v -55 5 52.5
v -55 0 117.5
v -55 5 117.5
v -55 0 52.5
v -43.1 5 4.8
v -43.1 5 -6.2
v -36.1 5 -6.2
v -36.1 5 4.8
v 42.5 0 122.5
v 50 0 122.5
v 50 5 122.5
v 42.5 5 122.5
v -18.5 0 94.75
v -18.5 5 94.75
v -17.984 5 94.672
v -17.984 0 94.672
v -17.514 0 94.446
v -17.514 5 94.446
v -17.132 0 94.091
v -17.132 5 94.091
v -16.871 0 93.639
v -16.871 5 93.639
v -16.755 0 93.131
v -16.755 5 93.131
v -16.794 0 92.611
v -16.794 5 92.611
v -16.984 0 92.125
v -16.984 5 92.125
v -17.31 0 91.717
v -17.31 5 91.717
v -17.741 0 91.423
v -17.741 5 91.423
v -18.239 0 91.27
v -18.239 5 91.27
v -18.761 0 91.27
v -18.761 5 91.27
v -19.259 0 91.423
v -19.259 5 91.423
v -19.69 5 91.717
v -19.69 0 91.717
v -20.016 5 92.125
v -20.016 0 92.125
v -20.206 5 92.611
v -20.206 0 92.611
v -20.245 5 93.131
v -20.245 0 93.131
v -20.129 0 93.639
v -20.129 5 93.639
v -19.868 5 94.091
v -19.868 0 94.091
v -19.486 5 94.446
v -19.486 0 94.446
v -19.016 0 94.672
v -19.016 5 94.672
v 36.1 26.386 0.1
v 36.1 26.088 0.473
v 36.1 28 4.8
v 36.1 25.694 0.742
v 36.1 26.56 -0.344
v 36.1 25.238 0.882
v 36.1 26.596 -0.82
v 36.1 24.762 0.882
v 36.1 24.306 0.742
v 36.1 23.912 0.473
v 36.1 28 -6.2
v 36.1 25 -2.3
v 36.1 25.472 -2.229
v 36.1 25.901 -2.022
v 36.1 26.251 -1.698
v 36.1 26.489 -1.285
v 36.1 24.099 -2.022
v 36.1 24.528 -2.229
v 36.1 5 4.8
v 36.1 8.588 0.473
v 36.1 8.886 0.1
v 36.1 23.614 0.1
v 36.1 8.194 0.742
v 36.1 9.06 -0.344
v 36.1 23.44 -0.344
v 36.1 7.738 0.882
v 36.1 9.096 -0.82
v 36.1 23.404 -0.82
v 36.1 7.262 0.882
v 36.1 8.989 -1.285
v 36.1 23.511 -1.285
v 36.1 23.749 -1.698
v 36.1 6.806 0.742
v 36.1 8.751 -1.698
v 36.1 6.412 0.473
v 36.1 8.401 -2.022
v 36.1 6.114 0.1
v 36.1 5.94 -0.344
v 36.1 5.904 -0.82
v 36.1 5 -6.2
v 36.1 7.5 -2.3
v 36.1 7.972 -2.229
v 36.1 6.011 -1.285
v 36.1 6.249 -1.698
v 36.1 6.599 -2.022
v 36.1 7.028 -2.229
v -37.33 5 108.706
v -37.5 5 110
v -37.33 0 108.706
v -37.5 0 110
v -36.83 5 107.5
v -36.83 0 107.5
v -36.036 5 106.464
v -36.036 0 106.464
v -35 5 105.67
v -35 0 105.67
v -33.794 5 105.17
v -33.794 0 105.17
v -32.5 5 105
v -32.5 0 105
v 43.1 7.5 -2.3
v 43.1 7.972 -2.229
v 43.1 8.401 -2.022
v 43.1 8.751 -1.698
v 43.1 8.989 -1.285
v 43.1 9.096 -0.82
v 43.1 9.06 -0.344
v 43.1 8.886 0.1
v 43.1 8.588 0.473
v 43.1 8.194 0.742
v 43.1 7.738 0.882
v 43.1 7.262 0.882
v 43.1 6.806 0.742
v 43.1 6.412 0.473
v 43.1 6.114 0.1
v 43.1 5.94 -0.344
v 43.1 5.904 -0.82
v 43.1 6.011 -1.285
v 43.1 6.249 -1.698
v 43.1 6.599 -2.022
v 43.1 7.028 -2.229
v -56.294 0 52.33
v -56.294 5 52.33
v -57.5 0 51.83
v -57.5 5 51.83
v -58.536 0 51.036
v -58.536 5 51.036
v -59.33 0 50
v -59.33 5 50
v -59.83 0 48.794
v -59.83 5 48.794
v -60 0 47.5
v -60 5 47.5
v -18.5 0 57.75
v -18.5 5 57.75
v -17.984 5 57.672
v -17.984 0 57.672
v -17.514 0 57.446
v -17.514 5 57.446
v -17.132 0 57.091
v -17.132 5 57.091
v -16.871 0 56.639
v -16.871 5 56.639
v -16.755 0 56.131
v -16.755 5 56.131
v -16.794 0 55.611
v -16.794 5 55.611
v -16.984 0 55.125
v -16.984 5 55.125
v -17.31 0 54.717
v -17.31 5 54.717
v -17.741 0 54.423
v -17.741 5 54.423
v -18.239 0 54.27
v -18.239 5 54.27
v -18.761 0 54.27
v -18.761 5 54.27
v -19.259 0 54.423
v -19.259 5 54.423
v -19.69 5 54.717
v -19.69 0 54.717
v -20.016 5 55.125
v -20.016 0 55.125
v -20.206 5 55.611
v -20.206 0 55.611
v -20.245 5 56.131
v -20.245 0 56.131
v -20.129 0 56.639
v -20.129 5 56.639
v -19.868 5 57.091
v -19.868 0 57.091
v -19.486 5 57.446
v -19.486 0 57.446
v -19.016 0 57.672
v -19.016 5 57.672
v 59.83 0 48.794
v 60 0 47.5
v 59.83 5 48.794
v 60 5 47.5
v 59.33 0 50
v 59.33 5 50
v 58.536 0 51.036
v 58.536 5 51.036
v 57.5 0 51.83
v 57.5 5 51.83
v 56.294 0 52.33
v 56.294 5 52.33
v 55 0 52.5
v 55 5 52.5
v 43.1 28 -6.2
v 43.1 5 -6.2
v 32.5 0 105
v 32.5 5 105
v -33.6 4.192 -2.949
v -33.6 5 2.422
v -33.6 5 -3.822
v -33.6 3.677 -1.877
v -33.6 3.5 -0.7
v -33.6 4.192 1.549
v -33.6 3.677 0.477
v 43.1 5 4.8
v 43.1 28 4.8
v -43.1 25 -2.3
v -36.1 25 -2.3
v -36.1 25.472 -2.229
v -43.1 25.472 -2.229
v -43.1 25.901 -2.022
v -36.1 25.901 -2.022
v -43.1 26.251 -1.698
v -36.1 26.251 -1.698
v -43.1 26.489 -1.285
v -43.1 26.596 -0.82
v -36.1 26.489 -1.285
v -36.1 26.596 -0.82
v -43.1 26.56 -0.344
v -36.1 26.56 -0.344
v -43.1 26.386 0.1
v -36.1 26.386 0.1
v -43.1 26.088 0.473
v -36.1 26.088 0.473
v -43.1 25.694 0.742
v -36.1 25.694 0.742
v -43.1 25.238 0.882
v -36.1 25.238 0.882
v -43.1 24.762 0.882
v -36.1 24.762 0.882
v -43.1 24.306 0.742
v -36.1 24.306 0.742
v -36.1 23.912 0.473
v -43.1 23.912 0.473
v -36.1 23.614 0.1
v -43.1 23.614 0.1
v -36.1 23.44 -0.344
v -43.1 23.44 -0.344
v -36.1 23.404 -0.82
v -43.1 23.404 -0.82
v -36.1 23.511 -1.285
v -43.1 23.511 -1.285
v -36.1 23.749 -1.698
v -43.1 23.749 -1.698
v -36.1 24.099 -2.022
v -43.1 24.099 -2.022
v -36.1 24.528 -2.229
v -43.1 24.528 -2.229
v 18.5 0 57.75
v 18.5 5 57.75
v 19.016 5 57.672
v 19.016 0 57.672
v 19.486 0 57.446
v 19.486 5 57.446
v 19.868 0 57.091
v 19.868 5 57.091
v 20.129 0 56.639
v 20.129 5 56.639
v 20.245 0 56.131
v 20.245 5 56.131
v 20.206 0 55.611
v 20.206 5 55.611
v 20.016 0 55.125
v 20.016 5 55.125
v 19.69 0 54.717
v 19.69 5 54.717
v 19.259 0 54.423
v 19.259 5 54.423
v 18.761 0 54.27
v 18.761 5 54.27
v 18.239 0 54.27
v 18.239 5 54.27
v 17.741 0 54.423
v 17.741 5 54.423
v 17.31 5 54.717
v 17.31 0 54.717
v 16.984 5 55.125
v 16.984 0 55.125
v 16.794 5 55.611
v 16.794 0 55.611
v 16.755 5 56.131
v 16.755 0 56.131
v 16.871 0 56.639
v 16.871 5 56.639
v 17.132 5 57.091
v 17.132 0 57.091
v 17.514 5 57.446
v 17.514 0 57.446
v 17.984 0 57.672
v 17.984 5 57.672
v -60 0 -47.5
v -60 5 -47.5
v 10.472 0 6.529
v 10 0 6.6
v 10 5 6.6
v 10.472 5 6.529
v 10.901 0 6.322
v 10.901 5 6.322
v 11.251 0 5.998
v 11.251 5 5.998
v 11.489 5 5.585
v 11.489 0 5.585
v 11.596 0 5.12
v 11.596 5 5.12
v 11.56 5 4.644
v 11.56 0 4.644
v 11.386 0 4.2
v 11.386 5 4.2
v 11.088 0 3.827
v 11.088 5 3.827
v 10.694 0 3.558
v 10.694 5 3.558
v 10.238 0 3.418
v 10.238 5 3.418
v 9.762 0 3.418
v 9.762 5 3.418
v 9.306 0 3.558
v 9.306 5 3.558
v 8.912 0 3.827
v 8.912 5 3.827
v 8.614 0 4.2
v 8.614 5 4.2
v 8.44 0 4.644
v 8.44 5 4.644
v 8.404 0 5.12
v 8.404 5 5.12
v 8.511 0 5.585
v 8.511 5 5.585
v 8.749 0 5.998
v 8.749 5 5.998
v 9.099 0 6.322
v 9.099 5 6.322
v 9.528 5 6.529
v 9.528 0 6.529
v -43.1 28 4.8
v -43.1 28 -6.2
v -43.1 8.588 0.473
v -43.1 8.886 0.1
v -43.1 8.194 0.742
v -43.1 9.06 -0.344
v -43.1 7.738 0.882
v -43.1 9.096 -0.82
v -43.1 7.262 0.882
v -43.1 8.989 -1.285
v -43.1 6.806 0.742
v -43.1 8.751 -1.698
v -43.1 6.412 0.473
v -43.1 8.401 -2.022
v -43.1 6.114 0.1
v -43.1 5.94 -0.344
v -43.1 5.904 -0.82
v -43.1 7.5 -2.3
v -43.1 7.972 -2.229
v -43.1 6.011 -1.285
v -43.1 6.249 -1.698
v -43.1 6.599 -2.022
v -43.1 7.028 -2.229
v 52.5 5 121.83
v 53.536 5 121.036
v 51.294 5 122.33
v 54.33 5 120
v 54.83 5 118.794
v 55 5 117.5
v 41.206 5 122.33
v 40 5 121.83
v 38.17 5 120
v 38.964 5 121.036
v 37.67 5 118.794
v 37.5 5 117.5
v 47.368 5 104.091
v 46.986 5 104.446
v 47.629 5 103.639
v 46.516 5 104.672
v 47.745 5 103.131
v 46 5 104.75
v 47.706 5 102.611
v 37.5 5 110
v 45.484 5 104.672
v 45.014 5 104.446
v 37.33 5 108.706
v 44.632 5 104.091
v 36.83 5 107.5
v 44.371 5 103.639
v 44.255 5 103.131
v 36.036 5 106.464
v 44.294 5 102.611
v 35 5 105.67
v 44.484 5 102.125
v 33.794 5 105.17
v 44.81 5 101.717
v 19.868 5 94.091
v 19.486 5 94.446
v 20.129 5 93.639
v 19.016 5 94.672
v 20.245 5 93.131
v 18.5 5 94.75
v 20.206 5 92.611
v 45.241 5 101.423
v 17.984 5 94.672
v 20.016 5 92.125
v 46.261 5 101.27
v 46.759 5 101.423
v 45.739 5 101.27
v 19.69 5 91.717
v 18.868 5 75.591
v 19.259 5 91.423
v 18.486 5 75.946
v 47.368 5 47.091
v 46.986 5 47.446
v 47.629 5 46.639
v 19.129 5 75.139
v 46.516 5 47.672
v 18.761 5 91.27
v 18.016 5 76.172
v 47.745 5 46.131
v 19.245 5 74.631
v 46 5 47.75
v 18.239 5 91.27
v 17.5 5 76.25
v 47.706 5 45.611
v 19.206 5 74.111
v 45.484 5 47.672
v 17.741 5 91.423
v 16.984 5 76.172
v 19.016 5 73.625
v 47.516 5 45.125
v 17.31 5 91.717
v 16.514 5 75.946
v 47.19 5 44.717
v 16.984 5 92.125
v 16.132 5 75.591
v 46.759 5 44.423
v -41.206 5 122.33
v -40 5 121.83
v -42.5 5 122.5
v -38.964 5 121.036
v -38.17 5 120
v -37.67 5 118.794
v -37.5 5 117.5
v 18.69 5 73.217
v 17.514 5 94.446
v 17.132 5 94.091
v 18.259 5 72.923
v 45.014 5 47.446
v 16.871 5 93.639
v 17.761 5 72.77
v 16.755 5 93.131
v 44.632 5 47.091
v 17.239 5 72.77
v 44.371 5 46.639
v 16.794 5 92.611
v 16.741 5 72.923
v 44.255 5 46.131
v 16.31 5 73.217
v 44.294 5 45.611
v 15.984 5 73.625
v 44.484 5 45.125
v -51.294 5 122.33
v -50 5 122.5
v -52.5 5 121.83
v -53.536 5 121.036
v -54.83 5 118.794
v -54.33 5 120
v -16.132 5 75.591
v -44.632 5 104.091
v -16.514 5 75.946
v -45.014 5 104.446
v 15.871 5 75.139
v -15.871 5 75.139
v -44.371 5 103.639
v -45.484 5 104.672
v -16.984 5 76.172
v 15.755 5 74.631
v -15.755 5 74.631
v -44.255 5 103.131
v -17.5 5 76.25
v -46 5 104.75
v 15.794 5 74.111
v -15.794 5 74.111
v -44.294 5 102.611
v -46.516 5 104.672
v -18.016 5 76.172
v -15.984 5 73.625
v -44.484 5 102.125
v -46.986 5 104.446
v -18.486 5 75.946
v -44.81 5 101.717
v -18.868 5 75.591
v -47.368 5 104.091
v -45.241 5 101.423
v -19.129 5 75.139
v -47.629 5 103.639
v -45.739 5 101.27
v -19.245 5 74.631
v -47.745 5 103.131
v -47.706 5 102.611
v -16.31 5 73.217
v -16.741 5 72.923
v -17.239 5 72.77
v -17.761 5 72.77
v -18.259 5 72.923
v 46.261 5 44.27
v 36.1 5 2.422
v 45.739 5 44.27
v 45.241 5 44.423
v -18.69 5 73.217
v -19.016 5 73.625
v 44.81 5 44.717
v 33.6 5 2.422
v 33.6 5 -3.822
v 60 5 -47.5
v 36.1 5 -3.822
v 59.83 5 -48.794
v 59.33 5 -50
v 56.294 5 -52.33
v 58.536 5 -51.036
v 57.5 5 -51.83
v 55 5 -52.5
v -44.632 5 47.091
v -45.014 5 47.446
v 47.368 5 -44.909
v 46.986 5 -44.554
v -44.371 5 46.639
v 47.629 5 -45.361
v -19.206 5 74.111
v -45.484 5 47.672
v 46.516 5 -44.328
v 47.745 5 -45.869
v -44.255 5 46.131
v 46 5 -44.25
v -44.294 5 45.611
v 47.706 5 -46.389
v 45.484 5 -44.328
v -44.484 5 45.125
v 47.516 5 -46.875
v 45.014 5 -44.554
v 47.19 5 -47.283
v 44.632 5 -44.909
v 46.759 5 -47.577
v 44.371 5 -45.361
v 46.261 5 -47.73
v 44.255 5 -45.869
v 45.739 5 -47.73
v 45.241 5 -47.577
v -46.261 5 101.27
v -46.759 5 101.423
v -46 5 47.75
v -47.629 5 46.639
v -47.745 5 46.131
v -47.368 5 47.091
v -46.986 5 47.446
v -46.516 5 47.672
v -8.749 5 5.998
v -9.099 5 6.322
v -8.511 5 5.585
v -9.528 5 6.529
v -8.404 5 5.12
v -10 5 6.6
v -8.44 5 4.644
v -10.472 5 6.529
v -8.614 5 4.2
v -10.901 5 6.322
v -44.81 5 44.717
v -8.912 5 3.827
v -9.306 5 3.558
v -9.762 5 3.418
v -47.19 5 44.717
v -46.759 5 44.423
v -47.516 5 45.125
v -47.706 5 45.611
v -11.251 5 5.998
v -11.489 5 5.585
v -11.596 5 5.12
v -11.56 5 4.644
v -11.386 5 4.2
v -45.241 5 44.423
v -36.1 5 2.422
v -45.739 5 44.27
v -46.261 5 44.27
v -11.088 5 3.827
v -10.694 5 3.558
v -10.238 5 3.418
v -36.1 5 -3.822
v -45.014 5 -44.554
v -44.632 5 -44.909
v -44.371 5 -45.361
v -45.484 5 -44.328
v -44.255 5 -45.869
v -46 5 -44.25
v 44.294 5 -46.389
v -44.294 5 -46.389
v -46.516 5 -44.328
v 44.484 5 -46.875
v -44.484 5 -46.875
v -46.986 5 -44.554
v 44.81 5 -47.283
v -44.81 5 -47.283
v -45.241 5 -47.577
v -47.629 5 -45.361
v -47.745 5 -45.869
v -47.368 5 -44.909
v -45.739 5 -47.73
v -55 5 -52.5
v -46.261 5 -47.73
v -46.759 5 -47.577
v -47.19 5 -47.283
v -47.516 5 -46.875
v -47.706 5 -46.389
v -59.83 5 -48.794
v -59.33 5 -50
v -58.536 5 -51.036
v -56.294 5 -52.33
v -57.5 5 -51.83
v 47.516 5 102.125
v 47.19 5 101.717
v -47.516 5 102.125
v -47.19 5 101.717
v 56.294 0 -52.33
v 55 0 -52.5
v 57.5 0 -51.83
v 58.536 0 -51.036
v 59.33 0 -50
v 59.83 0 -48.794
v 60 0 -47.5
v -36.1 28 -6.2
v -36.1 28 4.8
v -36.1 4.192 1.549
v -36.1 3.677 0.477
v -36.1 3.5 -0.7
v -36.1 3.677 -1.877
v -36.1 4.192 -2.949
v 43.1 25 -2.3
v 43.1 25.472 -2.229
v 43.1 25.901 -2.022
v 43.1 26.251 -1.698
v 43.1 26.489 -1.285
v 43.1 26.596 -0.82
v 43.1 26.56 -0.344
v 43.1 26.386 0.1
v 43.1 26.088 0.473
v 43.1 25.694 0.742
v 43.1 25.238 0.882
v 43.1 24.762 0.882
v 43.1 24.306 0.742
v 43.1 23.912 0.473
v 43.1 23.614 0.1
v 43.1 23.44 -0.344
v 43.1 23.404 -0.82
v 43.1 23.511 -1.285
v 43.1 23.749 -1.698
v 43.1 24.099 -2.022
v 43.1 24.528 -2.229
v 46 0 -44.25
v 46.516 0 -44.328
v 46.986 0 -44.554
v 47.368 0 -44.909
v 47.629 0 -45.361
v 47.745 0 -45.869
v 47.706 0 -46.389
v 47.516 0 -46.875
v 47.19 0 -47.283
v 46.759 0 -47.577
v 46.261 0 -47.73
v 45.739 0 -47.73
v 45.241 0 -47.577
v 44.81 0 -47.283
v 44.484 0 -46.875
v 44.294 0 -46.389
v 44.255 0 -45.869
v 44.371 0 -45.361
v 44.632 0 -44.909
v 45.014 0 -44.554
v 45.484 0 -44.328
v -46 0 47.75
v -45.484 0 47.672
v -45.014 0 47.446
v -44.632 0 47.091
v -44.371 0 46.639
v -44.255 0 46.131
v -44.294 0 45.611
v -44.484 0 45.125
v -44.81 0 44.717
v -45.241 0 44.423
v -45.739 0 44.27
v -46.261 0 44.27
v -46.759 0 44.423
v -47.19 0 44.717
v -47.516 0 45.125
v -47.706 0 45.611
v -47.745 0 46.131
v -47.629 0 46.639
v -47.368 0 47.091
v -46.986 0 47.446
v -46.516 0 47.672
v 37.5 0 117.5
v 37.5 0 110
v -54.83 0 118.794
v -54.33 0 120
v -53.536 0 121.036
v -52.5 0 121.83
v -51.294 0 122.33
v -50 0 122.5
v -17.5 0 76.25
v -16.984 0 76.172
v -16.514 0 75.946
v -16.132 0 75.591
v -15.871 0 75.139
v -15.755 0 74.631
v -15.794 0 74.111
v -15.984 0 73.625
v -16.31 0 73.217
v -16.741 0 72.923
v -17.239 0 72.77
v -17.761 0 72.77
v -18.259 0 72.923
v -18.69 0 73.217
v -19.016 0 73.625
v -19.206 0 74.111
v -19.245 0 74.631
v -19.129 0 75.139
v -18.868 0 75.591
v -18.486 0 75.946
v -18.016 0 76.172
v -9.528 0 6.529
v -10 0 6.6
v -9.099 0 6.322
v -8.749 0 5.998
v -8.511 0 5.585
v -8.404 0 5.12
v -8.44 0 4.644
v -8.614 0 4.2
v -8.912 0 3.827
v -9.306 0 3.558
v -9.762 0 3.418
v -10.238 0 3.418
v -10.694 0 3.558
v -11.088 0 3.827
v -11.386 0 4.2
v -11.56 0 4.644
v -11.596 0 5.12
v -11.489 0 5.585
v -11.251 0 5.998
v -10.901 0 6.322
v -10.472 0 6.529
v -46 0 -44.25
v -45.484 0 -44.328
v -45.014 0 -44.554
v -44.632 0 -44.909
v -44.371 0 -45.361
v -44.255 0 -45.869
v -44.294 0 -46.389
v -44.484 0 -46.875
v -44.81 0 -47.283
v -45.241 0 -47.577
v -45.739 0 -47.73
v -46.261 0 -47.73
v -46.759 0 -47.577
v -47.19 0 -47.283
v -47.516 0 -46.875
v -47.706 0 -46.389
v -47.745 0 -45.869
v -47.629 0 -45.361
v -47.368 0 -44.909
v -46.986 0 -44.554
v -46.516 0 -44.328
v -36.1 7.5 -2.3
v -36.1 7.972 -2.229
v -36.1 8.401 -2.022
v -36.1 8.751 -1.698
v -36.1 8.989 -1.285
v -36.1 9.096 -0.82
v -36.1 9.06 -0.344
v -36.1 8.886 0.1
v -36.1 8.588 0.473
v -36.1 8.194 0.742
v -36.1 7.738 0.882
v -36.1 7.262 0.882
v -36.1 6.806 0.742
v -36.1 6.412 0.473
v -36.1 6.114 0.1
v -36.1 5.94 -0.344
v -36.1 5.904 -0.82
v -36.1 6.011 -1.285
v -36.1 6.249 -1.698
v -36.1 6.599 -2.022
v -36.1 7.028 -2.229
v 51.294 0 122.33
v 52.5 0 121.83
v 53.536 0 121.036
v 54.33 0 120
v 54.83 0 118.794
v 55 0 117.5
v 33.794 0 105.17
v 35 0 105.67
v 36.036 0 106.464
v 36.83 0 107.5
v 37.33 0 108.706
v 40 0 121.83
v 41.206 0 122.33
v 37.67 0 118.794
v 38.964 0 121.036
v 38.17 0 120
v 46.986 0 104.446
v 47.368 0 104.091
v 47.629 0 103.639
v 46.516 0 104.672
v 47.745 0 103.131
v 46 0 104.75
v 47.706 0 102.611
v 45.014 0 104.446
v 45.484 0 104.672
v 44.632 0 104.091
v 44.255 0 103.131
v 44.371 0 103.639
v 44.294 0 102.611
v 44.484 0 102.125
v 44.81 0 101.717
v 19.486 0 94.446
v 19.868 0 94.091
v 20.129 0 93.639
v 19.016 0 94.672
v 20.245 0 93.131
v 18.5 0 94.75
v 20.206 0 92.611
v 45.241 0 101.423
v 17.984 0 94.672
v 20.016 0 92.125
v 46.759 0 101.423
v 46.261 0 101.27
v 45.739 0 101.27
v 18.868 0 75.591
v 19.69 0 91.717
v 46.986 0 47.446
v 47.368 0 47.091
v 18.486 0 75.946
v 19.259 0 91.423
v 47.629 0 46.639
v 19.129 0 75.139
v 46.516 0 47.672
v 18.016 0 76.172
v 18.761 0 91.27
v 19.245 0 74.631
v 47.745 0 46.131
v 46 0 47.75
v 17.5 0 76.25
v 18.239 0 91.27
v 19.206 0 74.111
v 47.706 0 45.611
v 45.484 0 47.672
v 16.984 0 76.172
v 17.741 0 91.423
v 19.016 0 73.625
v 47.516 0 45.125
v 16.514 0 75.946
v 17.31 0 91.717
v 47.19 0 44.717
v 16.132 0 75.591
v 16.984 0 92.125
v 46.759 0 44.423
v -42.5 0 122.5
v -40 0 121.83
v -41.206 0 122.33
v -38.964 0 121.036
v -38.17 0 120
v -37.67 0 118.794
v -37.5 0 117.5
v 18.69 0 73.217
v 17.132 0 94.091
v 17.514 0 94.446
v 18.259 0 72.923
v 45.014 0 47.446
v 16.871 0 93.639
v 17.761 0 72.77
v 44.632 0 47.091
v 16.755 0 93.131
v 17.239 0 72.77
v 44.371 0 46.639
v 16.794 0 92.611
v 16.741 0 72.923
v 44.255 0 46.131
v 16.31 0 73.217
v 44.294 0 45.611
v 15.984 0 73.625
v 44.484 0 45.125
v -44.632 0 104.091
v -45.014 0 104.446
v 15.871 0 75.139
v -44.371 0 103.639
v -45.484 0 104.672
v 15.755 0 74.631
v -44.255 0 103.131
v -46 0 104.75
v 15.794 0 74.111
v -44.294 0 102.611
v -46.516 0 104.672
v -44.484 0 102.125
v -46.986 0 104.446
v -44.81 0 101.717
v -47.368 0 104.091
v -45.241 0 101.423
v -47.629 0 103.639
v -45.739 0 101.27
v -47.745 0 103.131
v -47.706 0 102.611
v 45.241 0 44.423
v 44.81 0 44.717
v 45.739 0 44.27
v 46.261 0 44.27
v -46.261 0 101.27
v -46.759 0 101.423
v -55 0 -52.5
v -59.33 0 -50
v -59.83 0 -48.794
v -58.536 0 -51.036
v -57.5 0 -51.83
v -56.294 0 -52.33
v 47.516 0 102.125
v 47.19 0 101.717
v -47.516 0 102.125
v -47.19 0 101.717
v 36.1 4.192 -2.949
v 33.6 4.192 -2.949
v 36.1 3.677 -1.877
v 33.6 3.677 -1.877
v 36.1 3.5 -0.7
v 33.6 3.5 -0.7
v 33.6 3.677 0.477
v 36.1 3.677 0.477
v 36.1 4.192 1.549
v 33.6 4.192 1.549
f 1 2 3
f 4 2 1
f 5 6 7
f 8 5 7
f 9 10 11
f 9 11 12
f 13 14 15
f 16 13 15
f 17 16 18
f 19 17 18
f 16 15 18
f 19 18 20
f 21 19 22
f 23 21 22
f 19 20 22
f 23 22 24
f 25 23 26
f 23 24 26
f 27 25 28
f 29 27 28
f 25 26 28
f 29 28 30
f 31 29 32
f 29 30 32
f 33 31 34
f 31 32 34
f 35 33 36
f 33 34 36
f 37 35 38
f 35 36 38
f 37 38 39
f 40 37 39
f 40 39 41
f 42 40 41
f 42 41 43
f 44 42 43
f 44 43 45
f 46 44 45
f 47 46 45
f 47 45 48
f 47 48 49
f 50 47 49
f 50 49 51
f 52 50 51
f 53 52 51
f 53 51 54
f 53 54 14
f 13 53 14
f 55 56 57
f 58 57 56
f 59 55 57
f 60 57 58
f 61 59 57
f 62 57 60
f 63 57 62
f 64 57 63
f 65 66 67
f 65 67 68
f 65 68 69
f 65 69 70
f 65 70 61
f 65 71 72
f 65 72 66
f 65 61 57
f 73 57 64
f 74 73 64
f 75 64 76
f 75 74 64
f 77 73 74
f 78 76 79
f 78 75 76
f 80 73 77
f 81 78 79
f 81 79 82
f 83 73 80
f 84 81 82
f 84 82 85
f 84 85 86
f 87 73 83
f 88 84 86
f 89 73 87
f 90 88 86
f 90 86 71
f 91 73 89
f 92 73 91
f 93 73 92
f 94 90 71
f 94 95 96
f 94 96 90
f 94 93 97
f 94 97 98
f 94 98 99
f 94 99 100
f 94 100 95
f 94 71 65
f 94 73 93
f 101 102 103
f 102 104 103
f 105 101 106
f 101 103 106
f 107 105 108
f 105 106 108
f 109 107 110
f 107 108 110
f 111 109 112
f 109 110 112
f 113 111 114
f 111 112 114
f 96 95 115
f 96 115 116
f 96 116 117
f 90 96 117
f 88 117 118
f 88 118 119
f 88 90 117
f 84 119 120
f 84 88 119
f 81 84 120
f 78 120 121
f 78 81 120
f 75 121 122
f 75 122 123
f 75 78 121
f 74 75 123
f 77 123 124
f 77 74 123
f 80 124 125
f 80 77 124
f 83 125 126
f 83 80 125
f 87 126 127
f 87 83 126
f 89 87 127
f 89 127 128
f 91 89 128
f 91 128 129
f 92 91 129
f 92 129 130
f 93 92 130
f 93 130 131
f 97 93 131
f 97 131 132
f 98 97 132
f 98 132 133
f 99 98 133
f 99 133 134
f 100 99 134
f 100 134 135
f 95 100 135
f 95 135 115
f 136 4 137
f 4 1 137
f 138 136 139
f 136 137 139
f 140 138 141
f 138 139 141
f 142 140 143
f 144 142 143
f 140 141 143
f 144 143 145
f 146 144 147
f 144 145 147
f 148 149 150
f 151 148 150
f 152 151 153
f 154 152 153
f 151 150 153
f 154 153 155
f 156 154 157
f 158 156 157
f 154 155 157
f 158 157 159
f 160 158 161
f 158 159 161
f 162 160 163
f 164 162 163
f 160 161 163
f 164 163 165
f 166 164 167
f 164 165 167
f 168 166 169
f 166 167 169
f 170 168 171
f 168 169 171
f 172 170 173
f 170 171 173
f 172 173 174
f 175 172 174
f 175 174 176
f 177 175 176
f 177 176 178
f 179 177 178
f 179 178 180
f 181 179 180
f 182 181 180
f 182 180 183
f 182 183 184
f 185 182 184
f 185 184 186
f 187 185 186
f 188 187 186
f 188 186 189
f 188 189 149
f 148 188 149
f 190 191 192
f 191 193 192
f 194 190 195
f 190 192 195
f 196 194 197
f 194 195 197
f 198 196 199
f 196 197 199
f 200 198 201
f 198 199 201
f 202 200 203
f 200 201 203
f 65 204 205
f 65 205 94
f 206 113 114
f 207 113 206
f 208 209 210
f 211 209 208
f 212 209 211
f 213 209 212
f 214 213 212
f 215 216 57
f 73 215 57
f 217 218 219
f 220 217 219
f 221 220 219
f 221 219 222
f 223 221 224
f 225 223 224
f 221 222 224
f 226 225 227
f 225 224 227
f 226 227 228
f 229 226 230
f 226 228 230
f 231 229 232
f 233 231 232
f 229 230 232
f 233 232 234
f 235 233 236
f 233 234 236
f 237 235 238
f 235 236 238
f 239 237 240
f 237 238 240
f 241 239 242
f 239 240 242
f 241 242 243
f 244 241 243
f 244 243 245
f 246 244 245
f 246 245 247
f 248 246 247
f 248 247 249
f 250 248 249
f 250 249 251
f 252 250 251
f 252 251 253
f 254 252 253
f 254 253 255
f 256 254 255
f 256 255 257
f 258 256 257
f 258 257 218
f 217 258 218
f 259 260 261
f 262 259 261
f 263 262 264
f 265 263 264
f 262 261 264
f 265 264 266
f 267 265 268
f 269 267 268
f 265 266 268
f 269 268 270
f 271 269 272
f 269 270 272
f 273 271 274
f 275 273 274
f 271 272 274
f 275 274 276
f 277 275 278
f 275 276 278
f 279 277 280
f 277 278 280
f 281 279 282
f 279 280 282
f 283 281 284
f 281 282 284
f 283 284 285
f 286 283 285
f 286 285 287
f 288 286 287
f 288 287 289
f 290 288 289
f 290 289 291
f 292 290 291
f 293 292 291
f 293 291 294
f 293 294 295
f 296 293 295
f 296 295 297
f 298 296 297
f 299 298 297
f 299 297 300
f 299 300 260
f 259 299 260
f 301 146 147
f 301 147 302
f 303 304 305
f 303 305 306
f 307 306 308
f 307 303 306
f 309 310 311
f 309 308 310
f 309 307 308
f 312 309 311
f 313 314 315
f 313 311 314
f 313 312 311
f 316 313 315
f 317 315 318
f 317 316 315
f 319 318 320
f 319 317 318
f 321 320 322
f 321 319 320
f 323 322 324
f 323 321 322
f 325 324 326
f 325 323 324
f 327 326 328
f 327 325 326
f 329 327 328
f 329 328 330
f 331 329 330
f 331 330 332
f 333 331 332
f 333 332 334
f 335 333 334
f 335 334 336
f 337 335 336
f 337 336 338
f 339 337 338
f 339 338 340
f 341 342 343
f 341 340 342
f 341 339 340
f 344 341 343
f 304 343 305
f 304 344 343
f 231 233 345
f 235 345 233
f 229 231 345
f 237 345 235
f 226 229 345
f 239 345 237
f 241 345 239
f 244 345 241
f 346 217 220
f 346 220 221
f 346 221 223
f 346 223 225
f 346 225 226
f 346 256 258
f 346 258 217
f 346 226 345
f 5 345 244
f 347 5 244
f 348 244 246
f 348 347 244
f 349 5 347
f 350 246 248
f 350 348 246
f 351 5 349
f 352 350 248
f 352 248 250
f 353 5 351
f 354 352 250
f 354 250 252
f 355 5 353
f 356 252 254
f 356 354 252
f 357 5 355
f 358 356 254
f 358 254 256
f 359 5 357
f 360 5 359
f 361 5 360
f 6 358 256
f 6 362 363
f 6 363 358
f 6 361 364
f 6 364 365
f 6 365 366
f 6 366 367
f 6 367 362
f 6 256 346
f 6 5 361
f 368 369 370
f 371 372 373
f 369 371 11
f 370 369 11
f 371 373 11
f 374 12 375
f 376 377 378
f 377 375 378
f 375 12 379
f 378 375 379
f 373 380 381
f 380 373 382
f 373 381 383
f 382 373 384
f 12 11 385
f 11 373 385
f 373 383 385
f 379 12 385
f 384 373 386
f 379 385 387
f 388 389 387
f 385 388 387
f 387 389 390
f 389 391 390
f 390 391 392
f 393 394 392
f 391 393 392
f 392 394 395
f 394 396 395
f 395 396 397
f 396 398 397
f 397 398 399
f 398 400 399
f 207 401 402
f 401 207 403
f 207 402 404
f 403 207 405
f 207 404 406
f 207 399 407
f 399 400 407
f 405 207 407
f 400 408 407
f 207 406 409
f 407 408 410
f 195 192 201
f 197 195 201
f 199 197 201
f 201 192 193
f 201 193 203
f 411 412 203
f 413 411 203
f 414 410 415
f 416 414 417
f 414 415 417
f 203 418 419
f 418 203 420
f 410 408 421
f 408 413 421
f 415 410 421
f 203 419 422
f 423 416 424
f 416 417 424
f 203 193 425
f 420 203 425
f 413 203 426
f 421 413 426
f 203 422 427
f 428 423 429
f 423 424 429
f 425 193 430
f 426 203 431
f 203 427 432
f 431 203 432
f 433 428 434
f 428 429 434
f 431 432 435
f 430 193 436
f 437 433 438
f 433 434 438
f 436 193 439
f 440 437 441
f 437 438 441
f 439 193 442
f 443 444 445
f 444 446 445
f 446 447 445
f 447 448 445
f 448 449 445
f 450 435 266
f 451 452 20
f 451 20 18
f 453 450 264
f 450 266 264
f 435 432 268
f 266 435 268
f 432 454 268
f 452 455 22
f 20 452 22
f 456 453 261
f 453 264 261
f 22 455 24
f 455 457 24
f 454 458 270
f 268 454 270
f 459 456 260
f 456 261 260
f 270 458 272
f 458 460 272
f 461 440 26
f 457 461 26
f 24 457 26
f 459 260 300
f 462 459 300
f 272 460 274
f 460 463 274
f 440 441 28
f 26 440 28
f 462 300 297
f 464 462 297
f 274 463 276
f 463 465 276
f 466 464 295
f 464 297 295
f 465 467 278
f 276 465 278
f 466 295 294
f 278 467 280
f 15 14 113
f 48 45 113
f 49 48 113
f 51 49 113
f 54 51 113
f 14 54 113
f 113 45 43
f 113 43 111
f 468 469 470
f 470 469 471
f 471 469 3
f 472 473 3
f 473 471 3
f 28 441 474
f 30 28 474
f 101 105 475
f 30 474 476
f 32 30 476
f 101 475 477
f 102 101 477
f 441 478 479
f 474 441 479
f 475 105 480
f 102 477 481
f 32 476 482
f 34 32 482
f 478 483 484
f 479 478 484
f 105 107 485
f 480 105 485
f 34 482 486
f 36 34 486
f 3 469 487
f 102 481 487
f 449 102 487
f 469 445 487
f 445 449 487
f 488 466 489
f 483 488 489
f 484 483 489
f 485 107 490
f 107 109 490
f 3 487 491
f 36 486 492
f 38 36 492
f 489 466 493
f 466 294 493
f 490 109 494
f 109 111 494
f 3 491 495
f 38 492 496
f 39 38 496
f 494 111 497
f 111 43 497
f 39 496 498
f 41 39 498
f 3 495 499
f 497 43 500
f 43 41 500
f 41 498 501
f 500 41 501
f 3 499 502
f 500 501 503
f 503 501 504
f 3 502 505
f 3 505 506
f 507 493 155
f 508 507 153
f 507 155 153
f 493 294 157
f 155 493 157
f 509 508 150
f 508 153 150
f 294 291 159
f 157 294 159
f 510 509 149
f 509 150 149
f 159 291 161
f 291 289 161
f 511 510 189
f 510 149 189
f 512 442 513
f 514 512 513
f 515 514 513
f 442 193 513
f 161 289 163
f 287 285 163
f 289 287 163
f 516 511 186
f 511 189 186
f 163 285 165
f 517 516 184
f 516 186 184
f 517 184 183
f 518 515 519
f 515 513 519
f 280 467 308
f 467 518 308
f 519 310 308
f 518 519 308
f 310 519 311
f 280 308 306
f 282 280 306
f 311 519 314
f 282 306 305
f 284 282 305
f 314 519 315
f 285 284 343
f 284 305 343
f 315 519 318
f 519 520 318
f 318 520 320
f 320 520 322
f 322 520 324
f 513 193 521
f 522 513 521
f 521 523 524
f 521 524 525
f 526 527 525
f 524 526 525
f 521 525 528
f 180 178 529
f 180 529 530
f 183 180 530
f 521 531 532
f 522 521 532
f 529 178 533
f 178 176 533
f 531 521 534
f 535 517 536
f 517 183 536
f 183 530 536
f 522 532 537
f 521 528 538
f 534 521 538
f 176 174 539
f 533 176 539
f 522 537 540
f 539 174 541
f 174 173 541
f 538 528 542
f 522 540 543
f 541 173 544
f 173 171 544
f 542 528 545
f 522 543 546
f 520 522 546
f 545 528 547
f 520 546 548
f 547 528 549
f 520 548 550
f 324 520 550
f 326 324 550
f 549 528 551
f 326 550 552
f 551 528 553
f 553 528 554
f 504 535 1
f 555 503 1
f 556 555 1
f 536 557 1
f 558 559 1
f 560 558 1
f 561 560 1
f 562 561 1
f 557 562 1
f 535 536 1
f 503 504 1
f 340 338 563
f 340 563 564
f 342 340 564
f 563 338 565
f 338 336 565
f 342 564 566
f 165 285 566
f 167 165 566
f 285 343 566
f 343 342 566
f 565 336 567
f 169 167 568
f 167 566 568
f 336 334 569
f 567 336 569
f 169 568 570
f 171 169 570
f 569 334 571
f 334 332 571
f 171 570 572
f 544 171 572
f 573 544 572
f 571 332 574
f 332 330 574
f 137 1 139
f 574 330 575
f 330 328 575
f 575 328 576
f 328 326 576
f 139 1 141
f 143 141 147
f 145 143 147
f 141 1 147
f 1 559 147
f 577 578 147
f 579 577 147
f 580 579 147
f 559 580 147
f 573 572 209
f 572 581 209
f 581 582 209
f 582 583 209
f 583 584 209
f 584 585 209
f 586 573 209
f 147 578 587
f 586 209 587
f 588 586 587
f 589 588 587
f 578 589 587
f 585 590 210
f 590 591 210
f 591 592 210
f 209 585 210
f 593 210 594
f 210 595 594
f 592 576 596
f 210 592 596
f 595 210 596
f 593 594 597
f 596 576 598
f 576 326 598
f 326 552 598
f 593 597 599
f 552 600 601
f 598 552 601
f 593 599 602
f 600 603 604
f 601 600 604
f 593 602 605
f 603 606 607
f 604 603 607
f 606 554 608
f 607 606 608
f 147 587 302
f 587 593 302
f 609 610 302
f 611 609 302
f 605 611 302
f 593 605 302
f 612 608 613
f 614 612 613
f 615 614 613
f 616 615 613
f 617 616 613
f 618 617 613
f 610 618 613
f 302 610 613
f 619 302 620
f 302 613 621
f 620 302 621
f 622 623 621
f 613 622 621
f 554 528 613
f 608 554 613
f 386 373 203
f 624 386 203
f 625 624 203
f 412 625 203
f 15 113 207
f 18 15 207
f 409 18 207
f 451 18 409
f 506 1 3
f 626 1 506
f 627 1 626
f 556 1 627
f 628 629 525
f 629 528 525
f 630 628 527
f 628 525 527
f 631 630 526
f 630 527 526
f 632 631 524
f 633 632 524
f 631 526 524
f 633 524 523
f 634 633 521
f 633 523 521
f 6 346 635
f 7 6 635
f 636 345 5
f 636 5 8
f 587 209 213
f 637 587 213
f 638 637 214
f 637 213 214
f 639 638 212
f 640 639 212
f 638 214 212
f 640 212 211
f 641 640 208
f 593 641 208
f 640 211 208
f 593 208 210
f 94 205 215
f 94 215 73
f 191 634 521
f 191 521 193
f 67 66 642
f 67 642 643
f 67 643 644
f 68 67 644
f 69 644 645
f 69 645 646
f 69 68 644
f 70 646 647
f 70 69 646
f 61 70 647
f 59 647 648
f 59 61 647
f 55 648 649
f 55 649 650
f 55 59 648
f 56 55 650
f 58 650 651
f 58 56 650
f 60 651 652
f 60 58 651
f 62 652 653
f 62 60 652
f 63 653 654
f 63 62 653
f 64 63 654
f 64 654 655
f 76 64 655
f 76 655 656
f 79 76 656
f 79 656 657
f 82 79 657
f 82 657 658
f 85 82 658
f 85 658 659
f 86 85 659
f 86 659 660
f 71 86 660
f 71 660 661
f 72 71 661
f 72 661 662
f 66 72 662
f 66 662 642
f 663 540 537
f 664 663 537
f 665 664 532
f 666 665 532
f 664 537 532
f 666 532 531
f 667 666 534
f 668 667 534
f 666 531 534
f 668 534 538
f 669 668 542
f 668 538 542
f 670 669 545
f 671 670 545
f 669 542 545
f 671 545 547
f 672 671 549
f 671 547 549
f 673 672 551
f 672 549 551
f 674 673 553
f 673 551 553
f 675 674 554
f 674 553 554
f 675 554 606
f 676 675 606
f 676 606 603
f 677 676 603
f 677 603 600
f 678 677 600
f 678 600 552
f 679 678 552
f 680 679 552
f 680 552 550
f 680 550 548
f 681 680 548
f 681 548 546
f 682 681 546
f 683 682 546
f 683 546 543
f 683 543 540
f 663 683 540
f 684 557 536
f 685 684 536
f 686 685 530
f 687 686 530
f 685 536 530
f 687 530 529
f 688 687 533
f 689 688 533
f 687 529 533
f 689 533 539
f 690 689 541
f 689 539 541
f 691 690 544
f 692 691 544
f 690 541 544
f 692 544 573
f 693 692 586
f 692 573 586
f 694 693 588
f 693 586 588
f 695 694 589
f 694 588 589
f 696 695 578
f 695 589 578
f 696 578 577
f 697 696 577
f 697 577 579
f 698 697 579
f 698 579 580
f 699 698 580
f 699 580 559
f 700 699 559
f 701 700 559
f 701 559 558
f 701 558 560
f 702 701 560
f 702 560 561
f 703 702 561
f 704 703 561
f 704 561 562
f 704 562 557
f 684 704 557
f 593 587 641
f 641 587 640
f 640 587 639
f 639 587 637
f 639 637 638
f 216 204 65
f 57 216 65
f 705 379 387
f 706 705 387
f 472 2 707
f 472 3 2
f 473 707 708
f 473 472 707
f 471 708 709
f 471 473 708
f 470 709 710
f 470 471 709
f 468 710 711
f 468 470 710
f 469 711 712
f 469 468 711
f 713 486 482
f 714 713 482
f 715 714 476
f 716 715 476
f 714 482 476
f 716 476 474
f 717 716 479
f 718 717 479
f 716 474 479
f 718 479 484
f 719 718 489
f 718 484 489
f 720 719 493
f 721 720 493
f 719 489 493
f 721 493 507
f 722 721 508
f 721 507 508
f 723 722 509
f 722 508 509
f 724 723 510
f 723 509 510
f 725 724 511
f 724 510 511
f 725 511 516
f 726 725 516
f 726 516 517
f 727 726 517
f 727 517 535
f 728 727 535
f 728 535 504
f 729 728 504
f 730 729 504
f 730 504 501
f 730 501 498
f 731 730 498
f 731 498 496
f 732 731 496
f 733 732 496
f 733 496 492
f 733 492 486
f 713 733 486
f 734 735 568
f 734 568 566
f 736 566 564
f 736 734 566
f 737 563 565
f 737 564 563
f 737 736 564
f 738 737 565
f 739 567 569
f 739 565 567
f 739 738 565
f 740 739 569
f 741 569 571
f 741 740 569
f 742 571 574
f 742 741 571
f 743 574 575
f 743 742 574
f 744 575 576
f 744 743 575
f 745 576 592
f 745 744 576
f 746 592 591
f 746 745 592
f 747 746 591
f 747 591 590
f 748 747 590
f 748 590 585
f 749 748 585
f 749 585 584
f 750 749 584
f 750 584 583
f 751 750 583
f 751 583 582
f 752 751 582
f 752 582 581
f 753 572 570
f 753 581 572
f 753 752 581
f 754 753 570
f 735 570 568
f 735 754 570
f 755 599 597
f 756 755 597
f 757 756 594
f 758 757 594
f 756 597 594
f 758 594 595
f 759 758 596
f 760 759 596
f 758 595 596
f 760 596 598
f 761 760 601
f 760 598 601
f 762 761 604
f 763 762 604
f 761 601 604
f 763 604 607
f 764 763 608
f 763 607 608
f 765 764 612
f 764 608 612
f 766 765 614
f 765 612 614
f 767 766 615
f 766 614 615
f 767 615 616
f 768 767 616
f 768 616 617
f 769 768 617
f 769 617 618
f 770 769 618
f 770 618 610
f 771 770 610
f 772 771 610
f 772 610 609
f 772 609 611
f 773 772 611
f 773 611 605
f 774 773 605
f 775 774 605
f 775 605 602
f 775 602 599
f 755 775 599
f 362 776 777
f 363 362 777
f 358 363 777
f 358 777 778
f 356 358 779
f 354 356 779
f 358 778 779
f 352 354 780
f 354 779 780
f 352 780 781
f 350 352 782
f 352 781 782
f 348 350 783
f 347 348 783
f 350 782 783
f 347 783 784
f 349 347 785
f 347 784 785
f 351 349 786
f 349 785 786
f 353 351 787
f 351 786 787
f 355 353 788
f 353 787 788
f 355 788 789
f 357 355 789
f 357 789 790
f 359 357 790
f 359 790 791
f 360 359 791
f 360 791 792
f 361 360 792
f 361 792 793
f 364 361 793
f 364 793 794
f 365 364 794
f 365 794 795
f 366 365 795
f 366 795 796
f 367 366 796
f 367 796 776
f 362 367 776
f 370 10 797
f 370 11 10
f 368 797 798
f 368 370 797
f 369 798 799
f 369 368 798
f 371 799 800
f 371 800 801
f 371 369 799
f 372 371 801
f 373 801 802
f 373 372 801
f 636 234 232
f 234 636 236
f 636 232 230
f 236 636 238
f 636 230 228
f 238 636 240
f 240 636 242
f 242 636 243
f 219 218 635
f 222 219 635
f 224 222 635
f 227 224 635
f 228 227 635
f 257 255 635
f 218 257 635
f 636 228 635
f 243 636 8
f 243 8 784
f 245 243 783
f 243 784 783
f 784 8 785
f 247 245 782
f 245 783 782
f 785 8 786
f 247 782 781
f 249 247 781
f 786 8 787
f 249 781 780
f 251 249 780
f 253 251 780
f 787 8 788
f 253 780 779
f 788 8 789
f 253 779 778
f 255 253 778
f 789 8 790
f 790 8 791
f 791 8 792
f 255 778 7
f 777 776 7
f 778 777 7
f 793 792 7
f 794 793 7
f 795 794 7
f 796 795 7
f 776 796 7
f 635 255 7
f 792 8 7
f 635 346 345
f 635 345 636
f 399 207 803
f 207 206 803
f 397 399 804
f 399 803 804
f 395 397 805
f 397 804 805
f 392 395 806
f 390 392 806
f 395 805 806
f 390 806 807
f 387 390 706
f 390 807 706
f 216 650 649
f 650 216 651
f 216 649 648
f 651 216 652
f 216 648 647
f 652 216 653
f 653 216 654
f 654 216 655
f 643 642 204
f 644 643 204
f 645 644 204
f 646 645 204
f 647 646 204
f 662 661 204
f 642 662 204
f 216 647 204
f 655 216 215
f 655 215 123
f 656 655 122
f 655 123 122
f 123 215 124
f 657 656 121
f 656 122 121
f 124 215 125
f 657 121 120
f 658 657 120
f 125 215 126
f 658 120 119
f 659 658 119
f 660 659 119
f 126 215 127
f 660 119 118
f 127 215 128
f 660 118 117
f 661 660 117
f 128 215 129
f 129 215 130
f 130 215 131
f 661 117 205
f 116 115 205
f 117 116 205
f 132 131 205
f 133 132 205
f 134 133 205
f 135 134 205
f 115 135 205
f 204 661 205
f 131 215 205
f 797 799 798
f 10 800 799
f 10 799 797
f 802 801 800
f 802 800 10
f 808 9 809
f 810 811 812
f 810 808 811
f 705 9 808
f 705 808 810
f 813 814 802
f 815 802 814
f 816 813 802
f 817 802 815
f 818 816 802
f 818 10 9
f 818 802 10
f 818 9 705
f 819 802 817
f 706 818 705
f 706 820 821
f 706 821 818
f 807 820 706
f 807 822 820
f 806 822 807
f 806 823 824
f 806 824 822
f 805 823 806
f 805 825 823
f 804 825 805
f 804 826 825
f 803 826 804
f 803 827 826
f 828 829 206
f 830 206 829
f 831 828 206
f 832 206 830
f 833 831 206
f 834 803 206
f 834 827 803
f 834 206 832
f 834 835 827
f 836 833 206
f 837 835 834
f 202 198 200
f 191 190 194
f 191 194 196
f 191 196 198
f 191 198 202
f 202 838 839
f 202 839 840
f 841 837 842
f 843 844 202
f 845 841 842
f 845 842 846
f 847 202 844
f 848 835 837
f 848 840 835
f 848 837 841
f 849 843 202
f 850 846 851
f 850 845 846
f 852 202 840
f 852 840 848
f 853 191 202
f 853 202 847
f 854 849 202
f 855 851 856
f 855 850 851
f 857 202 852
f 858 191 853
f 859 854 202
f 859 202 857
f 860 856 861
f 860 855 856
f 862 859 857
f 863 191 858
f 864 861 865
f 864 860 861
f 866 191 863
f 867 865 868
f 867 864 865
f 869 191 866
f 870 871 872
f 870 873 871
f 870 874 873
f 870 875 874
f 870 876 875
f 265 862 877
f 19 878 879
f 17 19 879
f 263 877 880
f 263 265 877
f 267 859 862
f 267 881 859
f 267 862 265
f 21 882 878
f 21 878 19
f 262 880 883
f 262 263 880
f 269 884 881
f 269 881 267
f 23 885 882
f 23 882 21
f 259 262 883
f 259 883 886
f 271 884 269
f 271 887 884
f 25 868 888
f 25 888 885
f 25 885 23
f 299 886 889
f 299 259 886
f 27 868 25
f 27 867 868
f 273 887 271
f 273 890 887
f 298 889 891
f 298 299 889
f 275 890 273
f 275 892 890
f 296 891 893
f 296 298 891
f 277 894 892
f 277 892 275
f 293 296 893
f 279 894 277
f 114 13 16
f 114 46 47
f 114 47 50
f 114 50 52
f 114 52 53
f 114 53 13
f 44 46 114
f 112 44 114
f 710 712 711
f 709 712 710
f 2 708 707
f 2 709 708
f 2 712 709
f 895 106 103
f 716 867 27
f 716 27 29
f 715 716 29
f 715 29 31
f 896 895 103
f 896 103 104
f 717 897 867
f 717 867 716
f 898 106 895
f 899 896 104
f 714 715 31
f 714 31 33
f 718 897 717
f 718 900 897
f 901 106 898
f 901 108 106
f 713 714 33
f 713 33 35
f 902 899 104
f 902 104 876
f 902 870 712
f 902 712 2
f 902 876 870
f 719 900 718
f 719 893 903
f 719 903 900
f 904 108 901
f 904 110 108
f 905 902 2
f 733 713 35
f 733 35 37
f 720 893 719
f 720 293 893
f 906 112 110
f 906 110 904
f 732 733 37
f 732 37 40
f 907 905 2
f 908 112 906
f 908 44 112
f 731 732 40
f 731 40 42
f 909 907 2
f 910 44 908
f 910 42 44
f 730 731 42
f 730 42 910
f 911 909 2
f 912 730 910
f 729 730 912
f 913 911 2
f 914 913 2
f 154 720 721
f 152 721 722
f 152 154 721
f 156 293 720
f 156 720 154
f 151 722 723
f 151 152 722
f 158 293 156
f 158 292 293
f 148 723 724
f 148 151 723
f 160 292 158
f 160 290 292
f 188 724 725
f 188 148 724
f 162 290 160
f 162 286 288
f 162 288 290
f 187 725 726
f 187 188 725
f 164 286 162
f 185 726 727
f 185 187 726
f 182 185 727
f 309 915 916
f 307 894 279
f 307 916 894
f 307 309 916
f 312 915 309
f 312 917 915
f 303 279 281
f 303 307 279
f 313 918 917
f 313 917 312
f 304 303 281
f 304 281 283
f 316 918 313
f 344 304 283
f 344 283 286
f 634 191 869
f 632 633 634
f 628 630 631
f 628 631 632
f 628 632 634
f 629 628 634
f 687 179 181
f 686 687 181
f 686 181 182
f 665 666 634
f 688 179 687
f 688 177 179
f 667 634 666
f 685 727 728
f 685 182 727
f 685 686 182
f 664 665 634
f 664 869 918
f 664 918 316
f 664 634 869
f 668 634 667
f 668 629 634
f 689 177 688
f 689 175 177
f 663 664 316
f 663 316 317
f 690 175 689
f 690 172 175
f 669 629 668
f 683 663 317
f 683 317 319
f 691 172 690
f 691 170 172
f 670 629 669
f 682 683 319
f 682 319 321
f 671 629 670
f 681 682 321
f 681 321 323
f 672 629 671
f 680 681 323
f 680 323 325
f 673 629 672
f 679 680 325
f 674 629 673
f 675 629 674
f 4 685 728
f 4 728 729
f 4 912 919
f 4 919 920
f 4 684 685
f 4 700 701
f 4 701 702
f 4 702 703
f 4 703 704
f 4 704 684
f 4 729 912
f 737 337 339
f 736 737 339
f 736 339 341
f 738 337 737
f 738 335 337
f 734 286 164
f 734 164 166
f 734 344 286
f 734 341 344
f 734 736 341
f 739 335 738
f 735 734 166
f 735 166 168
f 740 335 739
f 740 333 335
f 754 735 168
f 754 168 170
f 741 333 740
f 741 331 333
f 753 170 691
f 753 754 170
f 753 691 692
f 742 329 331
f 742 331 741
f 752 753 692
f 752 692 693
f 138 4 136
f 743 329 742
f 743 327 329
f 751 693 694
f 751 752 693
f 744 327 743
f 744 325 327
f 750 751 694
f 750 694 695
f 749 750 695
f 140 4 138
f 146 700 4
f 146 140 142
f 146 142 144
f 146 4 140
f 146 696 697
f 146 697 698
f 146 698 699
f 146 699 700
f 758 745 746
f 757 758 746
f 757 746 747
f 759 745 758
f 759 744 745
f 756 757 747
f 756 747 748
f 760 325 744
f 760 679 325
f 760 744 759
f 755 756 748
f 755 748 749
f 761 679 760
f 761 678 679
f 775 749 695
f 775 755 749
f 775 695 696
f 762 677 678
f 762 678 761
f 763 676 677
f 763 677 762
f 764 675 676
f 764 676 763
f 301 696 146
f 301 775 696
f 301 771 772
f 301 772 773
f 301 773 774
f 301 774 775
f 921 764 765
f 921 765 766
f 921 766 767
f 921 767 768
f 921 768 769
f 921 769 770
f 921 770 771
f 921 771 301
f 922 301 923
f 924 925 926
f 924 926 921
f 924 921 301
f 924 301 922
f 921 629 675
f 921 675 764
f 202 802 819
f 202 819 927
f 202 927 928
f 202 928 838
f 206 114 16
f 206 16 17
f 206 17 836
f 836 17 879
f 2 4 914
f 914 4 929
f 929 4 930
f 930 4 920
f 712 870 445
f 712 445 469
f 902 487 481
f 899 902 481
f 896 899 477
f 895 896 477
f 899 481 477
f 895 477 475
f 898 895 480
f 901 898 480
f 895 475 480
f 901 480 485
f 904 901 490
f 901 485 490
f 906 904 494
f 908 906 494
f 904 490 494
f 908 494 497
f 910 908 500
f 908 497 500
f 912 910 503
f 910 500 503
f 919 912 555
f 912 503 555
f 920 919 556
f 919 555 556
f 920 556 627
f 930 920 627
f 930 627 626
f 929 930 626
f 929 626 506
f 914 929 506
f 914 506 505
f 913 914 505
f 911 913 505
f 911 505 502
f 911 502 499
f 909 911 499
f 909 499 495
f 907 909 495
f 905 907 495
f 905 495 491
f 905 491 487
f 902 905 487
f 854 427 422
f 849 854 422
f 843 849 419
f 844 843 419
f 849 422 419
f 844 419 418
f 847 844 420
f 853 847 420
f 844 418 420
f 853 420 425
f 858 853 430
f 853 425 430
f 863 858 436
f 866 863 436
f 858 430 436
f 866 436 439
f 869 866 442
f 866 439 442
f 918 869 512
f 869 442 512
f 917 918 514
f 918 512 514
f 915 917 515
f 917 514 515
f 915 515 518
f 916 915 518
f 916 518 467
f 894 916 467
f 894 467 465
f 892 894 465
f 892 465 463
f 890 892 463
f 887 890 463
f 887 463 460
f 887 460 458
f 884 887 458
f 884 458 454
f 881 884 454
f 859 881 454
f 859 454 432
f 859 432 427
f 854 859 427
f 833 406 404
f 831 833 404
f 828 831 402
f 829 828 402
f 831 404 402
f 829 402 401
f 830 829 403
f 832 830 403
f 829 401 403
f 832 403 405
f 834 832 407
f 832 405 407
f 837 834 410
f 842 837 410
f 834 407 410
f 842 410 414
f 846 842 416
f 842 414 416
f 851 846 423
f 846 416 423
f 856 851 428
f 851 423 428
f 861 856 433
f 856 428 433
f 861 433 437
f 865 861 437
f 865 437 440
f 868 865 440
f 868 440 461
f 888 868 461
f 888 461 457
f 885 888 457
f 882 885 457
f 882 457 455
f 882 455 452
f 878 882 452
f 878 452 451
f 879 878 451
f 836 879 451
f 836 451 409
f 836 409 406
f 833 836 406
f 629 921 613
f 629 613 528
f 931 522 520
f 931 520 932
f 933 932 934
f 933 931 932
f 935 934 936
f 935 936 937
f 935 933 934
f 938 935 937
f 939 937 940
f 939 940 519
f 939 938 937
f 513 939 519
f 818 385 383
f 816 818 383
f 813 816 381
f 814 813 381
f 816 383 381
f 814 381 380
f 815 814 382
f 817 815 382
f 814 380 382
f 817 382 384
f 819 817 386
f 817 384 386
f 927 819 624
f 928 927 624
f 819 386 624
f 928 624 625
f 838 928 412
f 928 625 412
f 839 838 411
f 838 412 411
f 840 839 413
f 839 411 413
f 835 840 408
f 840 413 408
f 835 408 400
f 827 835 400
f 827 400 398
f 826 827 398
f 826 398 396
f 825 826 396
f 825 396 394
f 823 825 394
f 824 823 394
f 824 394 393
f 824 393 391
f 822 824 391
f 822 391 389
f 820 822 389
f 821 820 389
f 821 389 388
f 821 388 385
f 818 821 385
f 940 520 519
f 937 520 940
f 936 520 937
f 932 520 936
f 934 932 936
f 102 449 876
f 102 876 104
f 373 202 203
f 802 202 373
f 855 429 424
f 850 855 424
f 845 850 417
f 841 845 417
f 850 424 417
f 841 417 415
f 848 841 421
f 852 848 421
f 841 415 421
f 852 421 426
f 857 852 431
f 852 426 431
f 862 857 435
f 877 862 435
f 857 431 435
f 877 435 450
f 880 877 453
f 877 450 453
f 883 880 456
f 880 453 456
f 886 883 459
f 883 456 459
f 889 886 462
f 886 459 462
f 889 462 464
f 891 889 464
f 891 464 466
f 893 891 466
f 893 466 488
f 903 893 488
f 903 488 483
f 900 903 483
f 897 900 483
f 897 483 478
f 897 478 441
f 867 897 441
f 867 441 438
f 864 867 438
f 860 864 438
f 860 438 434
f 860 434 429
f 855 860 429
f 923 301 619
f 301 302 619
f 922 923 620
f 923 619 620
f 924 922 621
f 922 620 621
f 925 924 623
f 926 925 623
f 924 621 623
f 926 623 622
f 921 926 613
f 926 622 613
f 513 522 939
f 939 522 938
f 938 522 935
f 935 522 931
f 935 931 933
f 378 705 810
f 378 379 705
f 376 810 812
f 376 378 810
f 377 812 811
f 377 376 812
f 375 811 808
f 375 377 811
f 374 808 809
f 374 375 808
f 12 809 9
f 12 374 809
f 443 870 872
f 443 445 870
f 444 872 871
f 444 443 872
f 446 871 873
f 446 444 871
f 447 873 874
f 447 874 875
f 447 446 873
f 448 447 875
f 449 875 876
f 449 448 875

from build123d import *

# Parameters (mm, degrees)
EXTRUDE_1_DEPTH             = 5
SKETCH_2_W                  = 7
SKETCH_2_H                  = 11
EXTRUDE_2_DEPTH             = 23
SKETCH_3_R                  = 1.6
CUT_EXTRUDE_1_DEPTH         = 159.19437411
SKETCH_5_R                  = 1.75
CUT_EXTRUDE_1416_DEPTH      = 139.330220849
SKETCH2_R                   = 4
CUT_EXTRUDE1_DEPTH          = 2.5
CUT_EXTRUDE2_START          = 2.5
SKETCH3_R                   = 4
CUT_EXTRUDE2_DEPTH          = 2.5
CUT_EXTRUDE_2297_DEPTH      = 139.330220849
CUT_EXTRUDE_2297_DEPTH_BACK = 139.330220849
SKETCH4_R                   = 1.6
SKETCH6_R                   = 1.75
CUT_EXTRUDE_2671_DEPTH      = 139.330220849
SKETCH7_R                   = 1.75
CUT_EXTRUDE_3080_DEPTH      = 139.330220849
SKETCH9_R                   = 1.75
CUT_EXTRUDE_3618_DEPTH      = 139.330220849
SKETCH8_W                   = 75
SKETCH8_H                   = 35
CUT_EXTRUDE7_DEPTH          = 139.330220849
FILLET_1_R                  = 5
FILLET2_R                   = 5


with BuildPart() as part:
    # 스케치1 → 보스-돌출1 (new body)
    with BuildSketch(Plane(origin=(0, 0, 0), x_dir=(1, 0, 0), z_dir=(0, 1, 0))):
        Polygon((-55, -52.5), (-60, -52.5), (-60, 52.5), (60, 52.5), (60, -52.5), (55, -52.5), (55, -122.5), (-55, -122.5), align=None)
    extrude(amount=EXTRUDE_1_DEPTH)

    # 스케치5 → Cut-Extrude 1416 (cut, through all)
    with BuildSketch(Plane(origin=(0, 5, 0), x_dir=(1, 0, 0), z_dir=(0, 1, 0))):
        with Locations(Location((-46, -46, 0), (0, 0, 270))):
            Circle(SKETCH_5_R)
        with Locations(Location((-46, 46, 0), (0, 0, 270))):
            Circle(SKETCH_5_R)
        with Locations(Location((46, 46, 0), (0, 0, 270))):
            Circle(SKETCH_5_R)
        with Locations(Location((46, -46, 0), (0, 0, 270))):
            Circle(SKETCH_5_R)
    extrude(amount=-CUT_EXTRUDE_1416_DEPTH, mode=Mode.SUBTRACT)

    # Sketch2 → Cut-Extrude1 (cut)
    with BuildSketch(Plane.ZY.offset(-36.1)):
        with Locations((-0.7, 7.5)):
            Circle(SKETCH2_R)
    extrude(amount=CUT_EXTRUDE1_DEPTH, mode=Mode.SUBTRACT)

    # Sketch3 → Cut-Extrude2 (cut)
    with BuildSketch(Plane(origin=(-36.1, 0, 0), x_dir=(0, 0, -1), z_dir=(1, 0, 0)).offset(CUT_EXTRUDE2_START)):
        with Locations((0.7, 7.5)):
            Circle(SKETCH3_R)
    extrude(amount=-CUT_EXTRUDE2_DEPTH, mode=Mode.SUBTRACT)

    # Sketch4 → Cut-Extrude 2297 (cut, two sides: drawn at the far end of the back side and taken through both)
    with BuildSketch(Plane(origin=(0, 5, 0), x_dir=(1, 0, 0), z_dir=(0, 1, 0)).offset(-CUT_EXTRUDE_2297_DEPTH_BACK)):
        with Locations(Location((-10, -5, 0), (0, 0, 270))):
            Circle(SKETCH4_R)
        with Locations(Location((10, -5, 0), (0, 0, 270))):
            Circle(SKETCH4_R)
    extrude(amount=CUT_EXTRUDE_2297_DEPTH + CUT_EXTRUDE_2297_DEPTH_BACK, mode=Mode.SUBTRACT)

    # Sketch6 → Cut-Extrude 2671 (cut, through all)
    with BuildSketch(Plane(origin=(0, 5, 0), x_dir=(1, 0, 0), z_dir=(0, 1, 0))):
        with Locations(Location((-18.5, -93, 0), (0, 0, 270))):
            Circle(SKETCH6_R)
        with Locations(Location((-18.5, -56, 0), (0, 0, 270))):
            Circle(SKETCH6_R)
        with Locations(Location((18.5, -56, 0), (0, 0, 270))):
            Circle(SKETCH6_R)
        with Locations(Location((18.5, -93, 0), (0, 0, 270))):
            Circle(SKETCH6_R)
    extrude(amount=-CUT_EXTRUDE_2671_DEPTH, mode=Mode.SUBTRACT)

    # Sketch7 → Cut-Extrude 3080 (cut, through all)
    with BuildSketch(Plane(origin=(0, 5, 0), x_dir=(1, 0, 0), z_dir=(0, 1, 0))):
        with Locations(Location((-46, -103, 0), (0, 0, 270))):
            Circle(SKETCH7_R)
        with Locations(Location((46, -103, 0), (0, 0, 270))):
            Circle(SKETCH7_R)
    extrude(amount=-CUT_EXTRUDE_3080_DEPTH, mode=Mode.SUBTRACT)

    # Sketch9 → Cut-Extrude 3618 (cut, through all)
    with BuildSketch(Plane(origin=(0, 5, 0), x_dir=(1, 0, 0), z_dir=(0, 1, 0))):
        with Locations(Location((-17.5, -74.5, 0), (0, 0, 270))):
            Circle(SKETCH9_R)
        with Locations(Location((17.5, -74.5, 0), (0, 0, 270))):
            Circle(SKETCH9_R)
    extrude(amount=-CUT_EXTRUDE_3618_DEPTH, mode=Mode.SUBTRACT)

    # Sketch8 → Cut-Extrude7 (cut, through all)
    with BuildSketch(Plane(origin=(0, 5, 0), x_dir=(1, 0, 0), z_dir=(0, 1, 0))):
        with Locations((0, -122.5)):
            Rectangle(SKETCH8_W, SKETCH8_H)
    extrude(amount=-CUT_EXTRUDE7_DEPTH, mode=Mode.SUBTRACT)

    # 필렛1
    fillet_1_edges = [part.edges().sort_by_distance(p)[0] for p in [
        (37.5, 2.5, 122.5),
        (37.5, 2.5, 105),
        (-37.5, 2.5, 122.5),
        (-37.5, 2.5, 105),
        (-60, 2.5, -52.5),
        (60, 2.5, -52.5),
        (55, 2.5, 122.5),
        (-55, 2.5, 122.5),
    ]]
    fillet(fillet_1_edges, radius=FILLET_1_R)

    # Fillet2
    fillet2_edges = [part.edges().sort_by_distance(p)[0] for p in [
        (60, 2.5, 52.5),
        (-60, 2.5, 52.5),
    ]]
    fillet(fillet2_edges, radius=FILLET2_R - 0.0001)  # a hair under: the kernel refuses the full size


with BuildPart() as body_2:
    # 스케치2 → 보스-돌출2 (new body)
    with BuildSketch(Plane(origin=(0, 5, 0), x_dir=(1, 0, 0), z_dir=(0, 1, 0))):
        with Locations((-39.6, 0.7)):
            Rectangle(SKETCH_2_W, SKETCH_2_H)
    extrude(amount=EXTRUDE_2_DEPTH)

    # 스케치3 → 컷-돌출1 (cut, through all)
    with BuildSketch(Plane(origin=(-36.1, 0, 0), x_dir=(0, 0, -1), z_dir=(1, 0, 0))):
        with Locations((0.7, 25)):
            Circle(SKETCH_3_R)
        with Locations((0.7, 7.5)):
            Circle(SKETCH_3_R)
    extrude(amount=-CUT_EXTRUDE_1_DEPTH, mode=Mode.SUBTRACT)


with BuildPart() as body_3:
    # 대칭 복사1: mirrored copy
    add(body_2.part.mirror(Plane(origin=(0, 0, 0), x_dir=(0, 0, 1), z_dir=(1, 0, 0))))


solid = Compound([part.part, body_2.part, body_3.part])
